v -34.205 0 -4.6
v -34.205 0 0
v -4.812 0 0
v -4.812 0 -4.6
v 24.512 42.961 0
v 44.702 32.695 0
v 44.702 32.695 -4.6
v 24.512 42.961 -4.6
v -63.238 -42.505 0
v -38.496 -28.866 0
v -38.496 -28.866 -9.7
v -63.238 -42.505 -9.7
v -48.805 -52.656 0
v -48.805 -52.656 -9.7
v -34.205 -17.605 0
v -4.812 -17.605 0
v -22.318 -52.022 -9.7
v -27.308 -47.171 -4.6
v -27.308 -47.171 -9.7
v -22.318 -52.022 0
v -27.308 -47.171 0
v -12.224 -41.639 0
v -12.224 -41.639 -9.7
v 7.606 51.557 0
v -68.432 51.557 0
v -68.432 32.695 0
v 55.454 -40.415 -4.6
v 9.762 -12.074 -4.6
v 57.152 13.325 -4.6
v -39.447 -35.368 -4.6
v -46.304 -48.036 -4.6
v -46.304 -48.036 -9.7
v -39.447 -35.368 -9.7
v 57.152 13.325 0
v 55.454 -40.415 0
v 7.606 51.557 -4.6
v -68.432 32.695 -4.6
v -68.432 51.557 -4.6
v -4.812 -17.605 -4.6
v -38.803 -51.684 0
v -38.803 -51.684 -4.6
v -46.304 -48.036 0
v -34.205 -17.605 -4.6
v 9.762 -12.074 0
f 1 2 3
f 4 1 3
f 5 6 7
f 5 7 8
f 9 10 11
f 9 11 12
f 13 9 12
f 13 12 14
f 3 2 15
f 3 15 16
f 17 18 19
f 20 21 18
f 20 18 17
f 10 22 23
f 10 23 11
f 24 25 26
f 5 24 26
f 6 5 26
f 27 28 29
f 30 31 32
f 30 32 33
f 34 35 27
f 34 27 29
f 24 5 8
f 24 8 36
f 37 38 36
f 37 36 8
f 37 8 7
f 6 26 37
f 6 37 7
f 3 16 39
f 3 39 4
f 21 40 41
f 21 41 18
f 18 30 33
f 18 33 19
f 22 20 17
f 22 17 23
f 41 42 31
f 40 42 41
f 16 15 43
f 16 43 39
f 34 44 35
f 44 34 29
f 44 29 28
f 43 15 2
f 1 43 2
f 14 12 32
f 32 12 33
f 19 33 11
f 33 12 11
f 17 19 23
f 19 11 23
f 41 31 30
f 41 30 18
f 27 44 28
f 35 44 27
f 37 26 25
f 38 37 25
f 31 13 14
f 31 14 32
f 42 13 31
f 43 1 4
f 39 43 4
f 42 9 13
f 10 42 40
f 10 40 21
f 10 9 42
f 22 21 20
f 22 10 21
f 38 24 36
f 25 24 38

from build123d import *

# Parameters (mm, degrees)
F1_DEPTH = 9.7
F0_W     = 9.863179177
F0_H     = 18.8622772694
F2_DEPTH = 4.6
F0_W_2   = 29.3937120587
F0_H_2   = 17.604790628


with BuildPart() as f1:
    # F0 (on Top) → F1 (new body)
    with BuildSketch(Plane.XY):
        Polygon((-38.4955778718, -28.8656055927), (-63.2375329733, -42.5053946674), (-48.8047227263, -52.6559427381), (-46.3042226437, -48.0363736752), (-39.4471921027, -35.3682972491), (-27.3076091883, -47.1706705536), (-22.3181508482, -52.0215332508), (-12.2244788289, -41.6394715056), align=None)
    extrude(amount=-F1_DEPTH)

    # F0 (on Top) → F2, piece 4 (join)
    with BuildSketch(Plane.XY):
        Polygon((-38.4955778718, -28.8656055927), (-63.2375329733, -42.5053946674), (-48.8047227263, -52.6559427381), (-46.3042226437, -48.0363736752), (-39.4471921027, -35.3682972491), (-27.3076091883, -47.1706705536), (-22.3181508482, -52.0215332508), (-12.2244788289, -41.6394715056), align=None)
        Polygon((-39.4471921027, -35.3682972491), (-46.3042226437, -48.0363736752), (-38.8028048201, -51.6838078871), (-27.3076091883, -47.1706705536), align=None)
    extrude(amount=-F2_DEPTH)


with BuildPart() as f2:
    # F0 (on Top) → F2 (new body)
    with BuildSketch(Plane.XY):
        with Locations((-63.5007191449, 42.1257503331)):
            Rectangle(F0_W, F0_H)
        Polygon((-58.5691295564, 51.5568889678), (-58.5691295564, 32.6946116984), (44.7018332779, 32.6946116984), (34.3673656484, 37.9494259188), (24.5120691447, 42.9605937961), (7.6060225256, 51.5568889678), align=None)
    extrude(amount=-F2_DEPTH)


with BuildPart() as f2b:
    # F0 (on Top) → F2, piece 2 (new body)
    with BuildSketch(Plane.XY):
        with Locations((-19.5084987208, -8.802395314)):
            Rectangle(F0_W_2, F0_H_2)
    extrude(amount=-F2_DEPTH)


with BuildPart() as f2c:
    # F0 (on Top) → F2, piece 3 (new body)
    with BuildSketch(Plane.XY):
        Polygon((9.7623080817, -12.0744576799), (55.4539933801, -40.4148735106), (57.151670794, 13.3254946149), align=None)
    extrude(amount=-F2_DEPTH)


solid = Compound([f1.part, f2.part, f2b.part, f2c.part])
